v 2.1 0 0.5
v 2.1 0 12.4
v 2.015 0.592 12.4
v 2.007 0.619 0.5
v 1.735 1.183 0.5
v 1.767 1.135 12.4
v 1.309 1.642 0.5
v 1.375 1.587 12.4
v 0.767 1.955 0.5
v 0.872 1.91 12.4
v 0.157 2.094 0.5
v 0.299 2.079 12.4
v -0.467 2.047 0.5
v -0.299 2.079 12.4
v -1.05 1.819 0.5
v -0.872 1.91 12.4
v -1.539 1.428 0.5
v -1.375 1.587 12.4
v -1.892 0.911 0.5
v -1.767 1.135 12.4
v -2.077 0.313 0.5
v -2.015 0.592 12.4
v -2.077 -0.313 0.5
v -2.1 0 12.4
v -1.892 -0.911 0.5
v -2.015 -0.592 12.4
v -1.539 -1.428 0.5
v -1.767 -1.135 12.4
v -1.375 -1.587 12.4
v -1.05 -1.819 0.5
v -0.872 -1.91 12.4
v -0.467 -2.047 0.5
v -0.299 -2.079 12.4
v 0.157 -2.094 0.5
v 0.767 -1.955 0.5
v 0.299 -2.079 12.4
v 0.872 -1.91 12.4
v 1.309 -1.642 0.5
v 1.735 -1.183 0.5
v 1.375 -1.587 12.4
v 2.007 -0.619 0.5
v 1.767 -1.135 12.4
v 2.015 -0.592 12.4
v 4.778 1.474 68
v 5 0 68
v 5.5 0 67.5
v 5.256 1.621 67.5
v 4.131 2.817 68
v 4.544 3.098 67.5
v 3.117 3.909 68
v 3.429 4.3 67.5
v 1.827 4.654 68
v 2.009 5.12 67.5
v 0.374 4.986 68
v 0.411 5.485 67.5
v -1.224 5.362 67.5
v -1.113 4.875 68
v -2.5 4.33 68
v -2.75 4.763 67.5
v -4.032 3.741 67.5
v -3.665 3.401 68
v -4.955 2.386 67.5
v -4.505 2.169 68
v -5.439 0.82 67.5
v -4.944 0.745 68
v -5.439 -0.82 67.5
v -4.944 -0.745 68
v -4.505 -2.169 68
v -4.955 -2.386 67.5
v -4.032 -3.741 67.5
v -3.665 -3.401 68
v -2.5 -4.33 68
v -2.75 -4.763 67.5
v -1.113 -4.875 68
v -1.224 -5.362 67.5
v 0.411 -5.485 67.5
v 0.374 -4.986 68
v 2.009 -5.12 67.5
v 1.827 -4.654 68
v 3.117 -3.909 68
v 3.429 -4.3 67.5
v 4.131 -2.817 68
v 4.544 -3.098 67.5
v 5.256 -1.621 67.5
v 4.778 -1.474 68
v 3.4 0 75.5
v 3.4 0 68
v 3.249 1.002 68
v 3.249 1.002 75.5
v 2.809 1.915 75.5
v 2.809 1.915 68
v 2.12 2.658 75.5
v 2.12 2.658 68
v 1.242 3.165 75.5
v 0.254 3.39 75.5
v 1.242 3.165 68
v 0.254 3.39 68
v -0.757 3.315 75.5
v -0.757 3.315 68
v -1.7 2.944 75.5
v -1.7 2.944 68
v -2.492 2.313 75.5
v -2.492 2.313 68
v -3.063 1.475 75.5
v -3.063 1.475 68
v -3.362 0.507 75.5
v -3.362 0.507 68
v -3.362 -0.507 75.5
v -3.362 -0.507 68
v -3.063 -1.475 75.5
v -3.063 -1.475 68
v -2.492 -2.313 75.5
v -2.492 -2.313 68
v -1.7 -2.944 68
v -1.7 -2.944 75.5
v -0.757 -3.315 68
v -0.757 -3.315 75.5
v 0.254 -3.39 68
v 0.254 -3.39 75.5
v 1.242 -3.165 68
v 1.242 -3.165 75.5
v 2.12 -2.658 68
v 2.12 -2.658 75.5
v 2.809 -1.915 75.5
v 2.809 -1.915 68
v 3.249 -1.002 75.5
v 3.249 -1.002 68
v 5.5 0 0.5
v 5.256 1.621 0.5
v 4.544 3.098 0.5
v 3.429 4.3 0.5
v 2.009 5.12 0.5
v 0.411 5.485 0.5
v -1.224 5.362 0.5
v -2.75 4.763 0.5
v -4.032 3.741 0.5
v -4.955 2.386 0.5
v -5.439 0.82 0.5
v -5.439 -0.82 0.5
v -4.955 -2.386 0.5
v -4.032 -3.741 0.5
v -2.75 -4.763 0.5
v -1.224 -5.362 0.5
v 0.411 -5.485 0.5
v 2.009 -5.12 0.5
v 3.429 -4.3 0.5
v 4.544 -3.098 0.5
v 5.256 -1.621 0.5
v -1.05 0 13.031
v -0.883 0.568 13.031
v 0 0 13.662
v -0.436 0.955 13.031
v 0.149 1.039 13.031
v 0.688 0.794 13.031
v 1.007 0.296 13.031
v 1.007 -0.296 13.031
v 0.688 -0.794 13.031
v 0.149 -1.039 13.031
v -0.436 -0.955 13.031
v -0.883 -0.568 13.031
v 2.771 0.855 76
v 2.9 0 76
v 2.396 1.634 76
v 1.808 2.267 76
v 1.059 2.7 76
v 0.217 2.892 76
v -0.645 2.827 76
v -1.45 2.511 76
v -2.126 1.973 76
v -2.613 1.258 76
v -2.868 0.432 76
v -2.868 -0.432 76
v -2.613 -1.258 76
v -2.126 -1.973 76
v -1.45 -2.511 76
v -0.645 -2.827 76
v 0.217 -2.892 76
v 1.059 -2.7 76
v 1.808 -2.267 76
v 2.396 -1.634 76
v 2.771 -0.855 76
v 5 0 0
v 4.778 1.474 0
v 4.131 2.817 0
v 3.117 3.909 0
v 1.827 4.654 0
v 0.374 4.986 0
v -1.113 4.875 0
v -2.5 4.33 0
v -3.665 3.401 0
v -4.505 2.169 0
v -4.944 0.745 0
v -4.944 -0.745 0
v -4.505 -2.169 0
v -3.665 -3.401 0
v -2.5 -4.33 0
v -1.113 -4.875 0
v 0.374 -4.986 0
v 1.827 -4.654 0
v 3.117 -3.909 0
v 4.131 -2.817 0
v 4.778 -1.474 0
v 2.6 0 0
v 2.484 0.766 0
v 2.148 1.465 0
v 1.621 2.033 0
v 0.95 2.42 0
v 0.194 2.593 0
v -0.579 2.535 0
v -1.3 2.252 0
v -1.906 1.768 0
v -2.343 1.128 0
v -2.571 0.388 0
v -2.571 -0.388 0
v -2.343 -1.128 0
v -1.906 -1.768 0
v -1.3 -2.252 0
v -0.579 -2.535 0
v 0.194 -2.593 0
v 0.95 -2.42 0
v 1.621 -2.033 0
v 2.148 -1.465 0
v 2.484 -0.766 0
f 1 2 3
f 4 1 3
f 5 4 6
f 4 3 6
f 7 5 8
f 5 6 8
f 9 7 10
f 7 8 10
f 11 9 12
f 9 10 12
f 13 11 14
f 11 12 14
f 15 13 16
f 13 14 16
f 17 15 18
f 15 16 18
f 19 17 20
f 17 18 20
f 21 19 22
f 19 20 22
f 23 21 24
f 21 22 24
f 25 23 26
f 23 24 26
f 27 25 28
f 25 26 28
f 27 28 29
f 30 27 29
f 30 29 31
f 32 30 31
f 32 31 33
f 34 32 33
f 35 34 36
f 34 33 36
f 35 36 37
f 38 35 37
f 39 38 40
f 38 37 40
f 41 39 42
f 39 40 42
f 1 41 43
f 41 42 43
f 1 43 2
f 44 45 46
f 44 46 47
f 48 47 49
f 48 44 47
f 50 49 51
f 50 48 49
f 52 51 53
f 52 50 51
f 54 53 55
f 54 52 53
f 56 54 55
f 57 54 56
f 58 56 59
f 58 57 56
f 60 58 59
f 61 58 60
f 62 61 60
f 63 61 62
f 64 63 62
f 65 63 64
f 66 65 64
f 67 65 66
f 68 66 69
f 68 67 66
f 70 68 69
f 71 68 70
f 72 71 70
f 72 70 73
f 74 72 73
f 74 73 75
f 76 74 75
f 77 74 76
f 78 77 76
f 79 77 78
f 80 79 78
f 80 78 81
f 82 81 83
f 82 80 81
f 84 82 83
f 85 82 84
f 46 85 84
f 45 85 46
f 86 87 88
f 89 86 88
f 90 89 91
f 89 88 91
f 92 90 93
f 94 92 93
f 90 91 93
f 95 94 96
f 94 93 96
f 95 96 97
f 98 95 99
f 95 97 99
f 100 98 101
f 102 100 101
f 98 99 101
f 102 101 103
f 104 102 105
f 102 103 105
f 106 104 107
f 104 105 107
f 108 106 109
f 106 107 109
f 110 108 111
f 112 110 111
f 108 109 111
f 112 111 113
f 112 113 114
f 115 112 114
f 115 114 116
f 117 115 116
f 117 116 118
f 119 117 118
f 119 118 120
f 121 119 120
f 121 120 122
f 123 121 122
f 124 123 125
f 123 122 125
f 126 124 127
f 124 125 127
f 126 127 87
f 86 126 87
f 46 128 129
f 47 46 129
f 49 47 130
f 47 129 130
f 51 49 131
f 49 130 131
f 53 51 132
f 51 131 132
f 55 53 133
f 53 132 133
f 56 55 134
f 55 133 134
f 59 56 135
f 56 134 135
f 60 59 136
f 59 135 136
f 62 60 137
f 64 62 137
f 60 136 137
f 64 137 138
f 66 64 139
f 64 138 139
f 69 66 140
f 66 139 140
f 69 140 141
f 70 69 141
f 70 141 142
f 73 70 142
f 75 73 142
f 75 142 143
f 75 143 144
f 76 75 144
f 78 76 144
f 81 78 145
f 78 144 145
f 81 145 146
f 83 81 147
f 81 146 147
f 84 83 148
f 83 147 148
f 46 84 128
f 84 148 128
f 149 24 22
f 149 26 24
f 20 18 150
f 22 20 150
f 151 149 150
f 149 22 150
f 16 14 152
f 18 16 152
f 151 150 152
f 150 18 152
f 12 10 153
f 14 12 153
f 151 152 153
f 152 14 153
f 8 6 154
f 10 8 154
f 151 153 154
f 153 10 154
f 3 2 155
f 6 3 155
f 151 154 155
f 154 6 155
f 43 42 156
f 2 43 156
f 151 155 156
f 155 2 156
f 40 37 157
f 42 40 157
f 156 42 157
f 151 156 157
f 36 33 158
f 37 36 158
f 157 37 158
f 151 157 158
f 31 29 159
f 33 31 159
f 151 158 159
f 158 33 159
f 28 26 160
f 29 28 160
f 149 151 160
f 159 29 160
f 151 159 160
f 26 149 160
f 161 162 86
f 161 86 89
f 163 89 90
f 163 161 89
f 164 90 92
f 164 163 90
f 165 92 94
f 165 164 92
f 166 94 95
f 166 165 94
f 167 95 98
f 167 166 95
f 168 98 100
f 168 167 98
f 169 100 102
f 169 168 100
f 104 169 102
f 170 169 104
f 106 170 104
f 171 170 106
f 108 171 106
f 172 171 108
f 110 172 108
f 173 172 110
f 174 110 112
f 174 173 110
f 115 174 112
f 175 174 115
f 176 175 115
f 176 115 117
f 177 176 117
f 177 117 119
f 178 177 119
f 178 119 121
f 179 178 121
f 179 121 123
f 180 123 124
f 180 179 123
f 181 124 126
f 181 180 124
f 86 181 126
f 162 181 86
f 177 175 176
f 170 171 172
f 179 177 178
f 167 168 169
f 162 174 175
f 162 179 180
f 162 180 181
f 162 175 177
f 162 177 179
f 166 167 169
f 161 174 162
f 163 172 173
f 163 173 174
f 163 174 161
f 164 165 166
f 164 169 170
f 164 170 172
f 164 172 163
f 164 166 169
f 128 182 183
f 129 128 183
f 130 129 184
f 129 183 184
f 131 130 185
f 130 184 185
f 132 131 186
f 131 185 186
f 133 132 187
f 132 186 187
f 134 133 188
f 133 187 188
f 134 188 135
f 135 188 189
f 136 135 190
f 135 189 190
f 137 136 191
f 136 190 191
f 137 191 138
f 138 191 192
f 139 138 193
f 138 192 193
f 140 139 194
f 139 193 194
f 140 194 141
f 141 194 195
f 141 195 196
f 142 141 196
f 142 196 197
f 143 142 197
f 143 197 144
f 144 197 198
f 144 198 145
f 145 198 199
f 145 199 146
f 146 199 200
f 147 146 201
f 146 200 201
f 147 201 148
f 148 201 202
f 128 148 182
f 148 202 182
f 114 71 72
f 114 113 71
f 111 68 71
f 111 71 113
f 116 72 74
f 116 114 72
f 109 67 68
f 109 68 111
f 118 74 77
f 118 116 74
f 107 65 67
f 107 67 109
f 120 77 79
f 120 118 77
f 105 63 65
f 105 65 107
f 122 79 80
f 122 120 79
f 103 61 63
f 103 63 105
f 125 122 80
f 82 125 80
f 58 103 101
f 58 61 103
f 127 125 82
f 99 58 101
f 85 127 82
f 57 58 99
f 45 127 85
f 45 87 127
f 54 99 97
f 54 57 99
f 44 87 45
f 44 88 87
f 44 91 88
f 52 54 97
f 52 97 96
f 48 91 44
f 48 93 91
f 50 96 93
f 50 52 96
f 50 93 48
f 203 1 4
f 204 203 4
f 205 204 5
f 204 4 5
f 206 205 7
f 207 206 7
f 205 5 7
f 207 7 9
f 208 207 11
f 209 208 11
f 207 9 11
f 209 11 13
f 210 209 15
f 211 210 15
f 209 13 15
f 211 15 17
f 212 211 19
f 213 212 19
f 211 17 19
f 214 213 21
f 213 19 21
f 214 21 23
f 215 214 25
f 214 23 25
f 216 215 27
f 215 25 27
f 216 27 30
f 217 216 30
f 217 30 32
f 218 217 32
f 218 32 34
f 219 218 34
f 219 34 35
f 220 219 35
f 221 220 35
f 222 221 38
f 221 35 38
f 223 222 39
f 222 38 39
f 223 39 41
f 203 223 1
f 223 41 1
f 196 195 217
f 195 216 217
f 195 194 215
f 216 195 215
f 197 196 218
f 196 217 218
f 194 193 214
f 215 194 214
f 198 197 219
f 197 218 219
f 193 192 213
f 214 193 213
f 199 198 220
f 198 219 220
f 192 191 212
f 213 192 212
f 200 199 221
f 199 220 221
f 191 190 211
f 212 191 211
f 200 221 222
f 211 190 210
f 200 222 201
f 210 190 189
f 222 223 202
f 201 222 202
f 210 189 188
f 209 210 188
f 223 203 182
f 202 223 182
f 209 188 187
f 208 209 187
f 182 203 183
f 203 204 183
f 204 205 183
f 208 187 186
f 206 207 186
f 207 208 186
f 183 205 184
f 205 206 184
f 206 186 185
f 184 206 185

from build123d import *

# Parameters (mm, degrees)
SKETCH_1_R             = 5.5
EXTRUDE_1_DEPTH        = 68
CHAMFER_1_SIZE         = 0.5
SKETCH_2_R             = 3.4
EXTRUDE_2_DEPTH        = 8
CHAMFER_2_SIZE         = 0.5
HOLE_WIZARD_M5_1_D     = 4.2
HOLE_WIZARD_M5_1_DEPTH = 12.4
HOLE_WIZARD_M5_1_TIP   = 1.2618073
CHAMFER_3_SIZE         = 0.5


with BuildPart() as part:
    # 草图1 → 拉伸1 (new body)
    with BuildSketch(Plane.XY):
        Circle(SKETCH_1_R)
    extrude(amount=EXTRUDE_1_DEPTH)

    # 倒角1
    chamfer_1_edges = [part.edges().sort_by_distance(p)[0] for p in [
        (-5.5, 0, 0),
        (-5.5, 0, 68),
    ]]
    chamfer(chamfer_1_edges, length=CHAMFER_1_SIZE)

    # 草图2 → 拉伸2 (add)
    with BuildSketch(Plane.XY.offset(68)):
        Circle(SKETCH_2_R)
    extrude(amount=EXTRUDE_2_DEPTH)

    # 倒角2
    chamfer_2_edges = [part.edges().sort_by_distance(p)[0] for p in [
        (-3.4, 0, 76),
    ]]
    chamfer(chamfer_2_edges, length=CHAMFER_2_SIZE)

    # M5 螺纹孔1
    with Locations(Plane(origin=(0, 0, 0), x_dir=(-1, 0, 0), z_dir=(0, 0, -1))):
        with Locations((0, 0)):
            Hole(HOLE_WIZARD_M5_1_D / 2, depth=HOLE_WIZARD_M5_1_DEPTH)
            with Locations((0, 0, -(HOLE_WIZARD_M5_1_DEPTH + HOLE_WIZARD_M5_1_TIP / 2))):  # 118° drill point
                Cone(0, HOLE_WIZARD_M5_1_D / 2, HOLE_WIZARD_M5_1_TIP, mode=Mode.SUBTRACT)

    # 倒角3
    chamfer_3_edges = [part.edges().sort_by_distance(p)[0] for p in [
        (-2.1, 0, 0),
    ]]
    chamfer(chamfer_3_edges, length=CHAMFER_3_SIZE)


solid = part.part
